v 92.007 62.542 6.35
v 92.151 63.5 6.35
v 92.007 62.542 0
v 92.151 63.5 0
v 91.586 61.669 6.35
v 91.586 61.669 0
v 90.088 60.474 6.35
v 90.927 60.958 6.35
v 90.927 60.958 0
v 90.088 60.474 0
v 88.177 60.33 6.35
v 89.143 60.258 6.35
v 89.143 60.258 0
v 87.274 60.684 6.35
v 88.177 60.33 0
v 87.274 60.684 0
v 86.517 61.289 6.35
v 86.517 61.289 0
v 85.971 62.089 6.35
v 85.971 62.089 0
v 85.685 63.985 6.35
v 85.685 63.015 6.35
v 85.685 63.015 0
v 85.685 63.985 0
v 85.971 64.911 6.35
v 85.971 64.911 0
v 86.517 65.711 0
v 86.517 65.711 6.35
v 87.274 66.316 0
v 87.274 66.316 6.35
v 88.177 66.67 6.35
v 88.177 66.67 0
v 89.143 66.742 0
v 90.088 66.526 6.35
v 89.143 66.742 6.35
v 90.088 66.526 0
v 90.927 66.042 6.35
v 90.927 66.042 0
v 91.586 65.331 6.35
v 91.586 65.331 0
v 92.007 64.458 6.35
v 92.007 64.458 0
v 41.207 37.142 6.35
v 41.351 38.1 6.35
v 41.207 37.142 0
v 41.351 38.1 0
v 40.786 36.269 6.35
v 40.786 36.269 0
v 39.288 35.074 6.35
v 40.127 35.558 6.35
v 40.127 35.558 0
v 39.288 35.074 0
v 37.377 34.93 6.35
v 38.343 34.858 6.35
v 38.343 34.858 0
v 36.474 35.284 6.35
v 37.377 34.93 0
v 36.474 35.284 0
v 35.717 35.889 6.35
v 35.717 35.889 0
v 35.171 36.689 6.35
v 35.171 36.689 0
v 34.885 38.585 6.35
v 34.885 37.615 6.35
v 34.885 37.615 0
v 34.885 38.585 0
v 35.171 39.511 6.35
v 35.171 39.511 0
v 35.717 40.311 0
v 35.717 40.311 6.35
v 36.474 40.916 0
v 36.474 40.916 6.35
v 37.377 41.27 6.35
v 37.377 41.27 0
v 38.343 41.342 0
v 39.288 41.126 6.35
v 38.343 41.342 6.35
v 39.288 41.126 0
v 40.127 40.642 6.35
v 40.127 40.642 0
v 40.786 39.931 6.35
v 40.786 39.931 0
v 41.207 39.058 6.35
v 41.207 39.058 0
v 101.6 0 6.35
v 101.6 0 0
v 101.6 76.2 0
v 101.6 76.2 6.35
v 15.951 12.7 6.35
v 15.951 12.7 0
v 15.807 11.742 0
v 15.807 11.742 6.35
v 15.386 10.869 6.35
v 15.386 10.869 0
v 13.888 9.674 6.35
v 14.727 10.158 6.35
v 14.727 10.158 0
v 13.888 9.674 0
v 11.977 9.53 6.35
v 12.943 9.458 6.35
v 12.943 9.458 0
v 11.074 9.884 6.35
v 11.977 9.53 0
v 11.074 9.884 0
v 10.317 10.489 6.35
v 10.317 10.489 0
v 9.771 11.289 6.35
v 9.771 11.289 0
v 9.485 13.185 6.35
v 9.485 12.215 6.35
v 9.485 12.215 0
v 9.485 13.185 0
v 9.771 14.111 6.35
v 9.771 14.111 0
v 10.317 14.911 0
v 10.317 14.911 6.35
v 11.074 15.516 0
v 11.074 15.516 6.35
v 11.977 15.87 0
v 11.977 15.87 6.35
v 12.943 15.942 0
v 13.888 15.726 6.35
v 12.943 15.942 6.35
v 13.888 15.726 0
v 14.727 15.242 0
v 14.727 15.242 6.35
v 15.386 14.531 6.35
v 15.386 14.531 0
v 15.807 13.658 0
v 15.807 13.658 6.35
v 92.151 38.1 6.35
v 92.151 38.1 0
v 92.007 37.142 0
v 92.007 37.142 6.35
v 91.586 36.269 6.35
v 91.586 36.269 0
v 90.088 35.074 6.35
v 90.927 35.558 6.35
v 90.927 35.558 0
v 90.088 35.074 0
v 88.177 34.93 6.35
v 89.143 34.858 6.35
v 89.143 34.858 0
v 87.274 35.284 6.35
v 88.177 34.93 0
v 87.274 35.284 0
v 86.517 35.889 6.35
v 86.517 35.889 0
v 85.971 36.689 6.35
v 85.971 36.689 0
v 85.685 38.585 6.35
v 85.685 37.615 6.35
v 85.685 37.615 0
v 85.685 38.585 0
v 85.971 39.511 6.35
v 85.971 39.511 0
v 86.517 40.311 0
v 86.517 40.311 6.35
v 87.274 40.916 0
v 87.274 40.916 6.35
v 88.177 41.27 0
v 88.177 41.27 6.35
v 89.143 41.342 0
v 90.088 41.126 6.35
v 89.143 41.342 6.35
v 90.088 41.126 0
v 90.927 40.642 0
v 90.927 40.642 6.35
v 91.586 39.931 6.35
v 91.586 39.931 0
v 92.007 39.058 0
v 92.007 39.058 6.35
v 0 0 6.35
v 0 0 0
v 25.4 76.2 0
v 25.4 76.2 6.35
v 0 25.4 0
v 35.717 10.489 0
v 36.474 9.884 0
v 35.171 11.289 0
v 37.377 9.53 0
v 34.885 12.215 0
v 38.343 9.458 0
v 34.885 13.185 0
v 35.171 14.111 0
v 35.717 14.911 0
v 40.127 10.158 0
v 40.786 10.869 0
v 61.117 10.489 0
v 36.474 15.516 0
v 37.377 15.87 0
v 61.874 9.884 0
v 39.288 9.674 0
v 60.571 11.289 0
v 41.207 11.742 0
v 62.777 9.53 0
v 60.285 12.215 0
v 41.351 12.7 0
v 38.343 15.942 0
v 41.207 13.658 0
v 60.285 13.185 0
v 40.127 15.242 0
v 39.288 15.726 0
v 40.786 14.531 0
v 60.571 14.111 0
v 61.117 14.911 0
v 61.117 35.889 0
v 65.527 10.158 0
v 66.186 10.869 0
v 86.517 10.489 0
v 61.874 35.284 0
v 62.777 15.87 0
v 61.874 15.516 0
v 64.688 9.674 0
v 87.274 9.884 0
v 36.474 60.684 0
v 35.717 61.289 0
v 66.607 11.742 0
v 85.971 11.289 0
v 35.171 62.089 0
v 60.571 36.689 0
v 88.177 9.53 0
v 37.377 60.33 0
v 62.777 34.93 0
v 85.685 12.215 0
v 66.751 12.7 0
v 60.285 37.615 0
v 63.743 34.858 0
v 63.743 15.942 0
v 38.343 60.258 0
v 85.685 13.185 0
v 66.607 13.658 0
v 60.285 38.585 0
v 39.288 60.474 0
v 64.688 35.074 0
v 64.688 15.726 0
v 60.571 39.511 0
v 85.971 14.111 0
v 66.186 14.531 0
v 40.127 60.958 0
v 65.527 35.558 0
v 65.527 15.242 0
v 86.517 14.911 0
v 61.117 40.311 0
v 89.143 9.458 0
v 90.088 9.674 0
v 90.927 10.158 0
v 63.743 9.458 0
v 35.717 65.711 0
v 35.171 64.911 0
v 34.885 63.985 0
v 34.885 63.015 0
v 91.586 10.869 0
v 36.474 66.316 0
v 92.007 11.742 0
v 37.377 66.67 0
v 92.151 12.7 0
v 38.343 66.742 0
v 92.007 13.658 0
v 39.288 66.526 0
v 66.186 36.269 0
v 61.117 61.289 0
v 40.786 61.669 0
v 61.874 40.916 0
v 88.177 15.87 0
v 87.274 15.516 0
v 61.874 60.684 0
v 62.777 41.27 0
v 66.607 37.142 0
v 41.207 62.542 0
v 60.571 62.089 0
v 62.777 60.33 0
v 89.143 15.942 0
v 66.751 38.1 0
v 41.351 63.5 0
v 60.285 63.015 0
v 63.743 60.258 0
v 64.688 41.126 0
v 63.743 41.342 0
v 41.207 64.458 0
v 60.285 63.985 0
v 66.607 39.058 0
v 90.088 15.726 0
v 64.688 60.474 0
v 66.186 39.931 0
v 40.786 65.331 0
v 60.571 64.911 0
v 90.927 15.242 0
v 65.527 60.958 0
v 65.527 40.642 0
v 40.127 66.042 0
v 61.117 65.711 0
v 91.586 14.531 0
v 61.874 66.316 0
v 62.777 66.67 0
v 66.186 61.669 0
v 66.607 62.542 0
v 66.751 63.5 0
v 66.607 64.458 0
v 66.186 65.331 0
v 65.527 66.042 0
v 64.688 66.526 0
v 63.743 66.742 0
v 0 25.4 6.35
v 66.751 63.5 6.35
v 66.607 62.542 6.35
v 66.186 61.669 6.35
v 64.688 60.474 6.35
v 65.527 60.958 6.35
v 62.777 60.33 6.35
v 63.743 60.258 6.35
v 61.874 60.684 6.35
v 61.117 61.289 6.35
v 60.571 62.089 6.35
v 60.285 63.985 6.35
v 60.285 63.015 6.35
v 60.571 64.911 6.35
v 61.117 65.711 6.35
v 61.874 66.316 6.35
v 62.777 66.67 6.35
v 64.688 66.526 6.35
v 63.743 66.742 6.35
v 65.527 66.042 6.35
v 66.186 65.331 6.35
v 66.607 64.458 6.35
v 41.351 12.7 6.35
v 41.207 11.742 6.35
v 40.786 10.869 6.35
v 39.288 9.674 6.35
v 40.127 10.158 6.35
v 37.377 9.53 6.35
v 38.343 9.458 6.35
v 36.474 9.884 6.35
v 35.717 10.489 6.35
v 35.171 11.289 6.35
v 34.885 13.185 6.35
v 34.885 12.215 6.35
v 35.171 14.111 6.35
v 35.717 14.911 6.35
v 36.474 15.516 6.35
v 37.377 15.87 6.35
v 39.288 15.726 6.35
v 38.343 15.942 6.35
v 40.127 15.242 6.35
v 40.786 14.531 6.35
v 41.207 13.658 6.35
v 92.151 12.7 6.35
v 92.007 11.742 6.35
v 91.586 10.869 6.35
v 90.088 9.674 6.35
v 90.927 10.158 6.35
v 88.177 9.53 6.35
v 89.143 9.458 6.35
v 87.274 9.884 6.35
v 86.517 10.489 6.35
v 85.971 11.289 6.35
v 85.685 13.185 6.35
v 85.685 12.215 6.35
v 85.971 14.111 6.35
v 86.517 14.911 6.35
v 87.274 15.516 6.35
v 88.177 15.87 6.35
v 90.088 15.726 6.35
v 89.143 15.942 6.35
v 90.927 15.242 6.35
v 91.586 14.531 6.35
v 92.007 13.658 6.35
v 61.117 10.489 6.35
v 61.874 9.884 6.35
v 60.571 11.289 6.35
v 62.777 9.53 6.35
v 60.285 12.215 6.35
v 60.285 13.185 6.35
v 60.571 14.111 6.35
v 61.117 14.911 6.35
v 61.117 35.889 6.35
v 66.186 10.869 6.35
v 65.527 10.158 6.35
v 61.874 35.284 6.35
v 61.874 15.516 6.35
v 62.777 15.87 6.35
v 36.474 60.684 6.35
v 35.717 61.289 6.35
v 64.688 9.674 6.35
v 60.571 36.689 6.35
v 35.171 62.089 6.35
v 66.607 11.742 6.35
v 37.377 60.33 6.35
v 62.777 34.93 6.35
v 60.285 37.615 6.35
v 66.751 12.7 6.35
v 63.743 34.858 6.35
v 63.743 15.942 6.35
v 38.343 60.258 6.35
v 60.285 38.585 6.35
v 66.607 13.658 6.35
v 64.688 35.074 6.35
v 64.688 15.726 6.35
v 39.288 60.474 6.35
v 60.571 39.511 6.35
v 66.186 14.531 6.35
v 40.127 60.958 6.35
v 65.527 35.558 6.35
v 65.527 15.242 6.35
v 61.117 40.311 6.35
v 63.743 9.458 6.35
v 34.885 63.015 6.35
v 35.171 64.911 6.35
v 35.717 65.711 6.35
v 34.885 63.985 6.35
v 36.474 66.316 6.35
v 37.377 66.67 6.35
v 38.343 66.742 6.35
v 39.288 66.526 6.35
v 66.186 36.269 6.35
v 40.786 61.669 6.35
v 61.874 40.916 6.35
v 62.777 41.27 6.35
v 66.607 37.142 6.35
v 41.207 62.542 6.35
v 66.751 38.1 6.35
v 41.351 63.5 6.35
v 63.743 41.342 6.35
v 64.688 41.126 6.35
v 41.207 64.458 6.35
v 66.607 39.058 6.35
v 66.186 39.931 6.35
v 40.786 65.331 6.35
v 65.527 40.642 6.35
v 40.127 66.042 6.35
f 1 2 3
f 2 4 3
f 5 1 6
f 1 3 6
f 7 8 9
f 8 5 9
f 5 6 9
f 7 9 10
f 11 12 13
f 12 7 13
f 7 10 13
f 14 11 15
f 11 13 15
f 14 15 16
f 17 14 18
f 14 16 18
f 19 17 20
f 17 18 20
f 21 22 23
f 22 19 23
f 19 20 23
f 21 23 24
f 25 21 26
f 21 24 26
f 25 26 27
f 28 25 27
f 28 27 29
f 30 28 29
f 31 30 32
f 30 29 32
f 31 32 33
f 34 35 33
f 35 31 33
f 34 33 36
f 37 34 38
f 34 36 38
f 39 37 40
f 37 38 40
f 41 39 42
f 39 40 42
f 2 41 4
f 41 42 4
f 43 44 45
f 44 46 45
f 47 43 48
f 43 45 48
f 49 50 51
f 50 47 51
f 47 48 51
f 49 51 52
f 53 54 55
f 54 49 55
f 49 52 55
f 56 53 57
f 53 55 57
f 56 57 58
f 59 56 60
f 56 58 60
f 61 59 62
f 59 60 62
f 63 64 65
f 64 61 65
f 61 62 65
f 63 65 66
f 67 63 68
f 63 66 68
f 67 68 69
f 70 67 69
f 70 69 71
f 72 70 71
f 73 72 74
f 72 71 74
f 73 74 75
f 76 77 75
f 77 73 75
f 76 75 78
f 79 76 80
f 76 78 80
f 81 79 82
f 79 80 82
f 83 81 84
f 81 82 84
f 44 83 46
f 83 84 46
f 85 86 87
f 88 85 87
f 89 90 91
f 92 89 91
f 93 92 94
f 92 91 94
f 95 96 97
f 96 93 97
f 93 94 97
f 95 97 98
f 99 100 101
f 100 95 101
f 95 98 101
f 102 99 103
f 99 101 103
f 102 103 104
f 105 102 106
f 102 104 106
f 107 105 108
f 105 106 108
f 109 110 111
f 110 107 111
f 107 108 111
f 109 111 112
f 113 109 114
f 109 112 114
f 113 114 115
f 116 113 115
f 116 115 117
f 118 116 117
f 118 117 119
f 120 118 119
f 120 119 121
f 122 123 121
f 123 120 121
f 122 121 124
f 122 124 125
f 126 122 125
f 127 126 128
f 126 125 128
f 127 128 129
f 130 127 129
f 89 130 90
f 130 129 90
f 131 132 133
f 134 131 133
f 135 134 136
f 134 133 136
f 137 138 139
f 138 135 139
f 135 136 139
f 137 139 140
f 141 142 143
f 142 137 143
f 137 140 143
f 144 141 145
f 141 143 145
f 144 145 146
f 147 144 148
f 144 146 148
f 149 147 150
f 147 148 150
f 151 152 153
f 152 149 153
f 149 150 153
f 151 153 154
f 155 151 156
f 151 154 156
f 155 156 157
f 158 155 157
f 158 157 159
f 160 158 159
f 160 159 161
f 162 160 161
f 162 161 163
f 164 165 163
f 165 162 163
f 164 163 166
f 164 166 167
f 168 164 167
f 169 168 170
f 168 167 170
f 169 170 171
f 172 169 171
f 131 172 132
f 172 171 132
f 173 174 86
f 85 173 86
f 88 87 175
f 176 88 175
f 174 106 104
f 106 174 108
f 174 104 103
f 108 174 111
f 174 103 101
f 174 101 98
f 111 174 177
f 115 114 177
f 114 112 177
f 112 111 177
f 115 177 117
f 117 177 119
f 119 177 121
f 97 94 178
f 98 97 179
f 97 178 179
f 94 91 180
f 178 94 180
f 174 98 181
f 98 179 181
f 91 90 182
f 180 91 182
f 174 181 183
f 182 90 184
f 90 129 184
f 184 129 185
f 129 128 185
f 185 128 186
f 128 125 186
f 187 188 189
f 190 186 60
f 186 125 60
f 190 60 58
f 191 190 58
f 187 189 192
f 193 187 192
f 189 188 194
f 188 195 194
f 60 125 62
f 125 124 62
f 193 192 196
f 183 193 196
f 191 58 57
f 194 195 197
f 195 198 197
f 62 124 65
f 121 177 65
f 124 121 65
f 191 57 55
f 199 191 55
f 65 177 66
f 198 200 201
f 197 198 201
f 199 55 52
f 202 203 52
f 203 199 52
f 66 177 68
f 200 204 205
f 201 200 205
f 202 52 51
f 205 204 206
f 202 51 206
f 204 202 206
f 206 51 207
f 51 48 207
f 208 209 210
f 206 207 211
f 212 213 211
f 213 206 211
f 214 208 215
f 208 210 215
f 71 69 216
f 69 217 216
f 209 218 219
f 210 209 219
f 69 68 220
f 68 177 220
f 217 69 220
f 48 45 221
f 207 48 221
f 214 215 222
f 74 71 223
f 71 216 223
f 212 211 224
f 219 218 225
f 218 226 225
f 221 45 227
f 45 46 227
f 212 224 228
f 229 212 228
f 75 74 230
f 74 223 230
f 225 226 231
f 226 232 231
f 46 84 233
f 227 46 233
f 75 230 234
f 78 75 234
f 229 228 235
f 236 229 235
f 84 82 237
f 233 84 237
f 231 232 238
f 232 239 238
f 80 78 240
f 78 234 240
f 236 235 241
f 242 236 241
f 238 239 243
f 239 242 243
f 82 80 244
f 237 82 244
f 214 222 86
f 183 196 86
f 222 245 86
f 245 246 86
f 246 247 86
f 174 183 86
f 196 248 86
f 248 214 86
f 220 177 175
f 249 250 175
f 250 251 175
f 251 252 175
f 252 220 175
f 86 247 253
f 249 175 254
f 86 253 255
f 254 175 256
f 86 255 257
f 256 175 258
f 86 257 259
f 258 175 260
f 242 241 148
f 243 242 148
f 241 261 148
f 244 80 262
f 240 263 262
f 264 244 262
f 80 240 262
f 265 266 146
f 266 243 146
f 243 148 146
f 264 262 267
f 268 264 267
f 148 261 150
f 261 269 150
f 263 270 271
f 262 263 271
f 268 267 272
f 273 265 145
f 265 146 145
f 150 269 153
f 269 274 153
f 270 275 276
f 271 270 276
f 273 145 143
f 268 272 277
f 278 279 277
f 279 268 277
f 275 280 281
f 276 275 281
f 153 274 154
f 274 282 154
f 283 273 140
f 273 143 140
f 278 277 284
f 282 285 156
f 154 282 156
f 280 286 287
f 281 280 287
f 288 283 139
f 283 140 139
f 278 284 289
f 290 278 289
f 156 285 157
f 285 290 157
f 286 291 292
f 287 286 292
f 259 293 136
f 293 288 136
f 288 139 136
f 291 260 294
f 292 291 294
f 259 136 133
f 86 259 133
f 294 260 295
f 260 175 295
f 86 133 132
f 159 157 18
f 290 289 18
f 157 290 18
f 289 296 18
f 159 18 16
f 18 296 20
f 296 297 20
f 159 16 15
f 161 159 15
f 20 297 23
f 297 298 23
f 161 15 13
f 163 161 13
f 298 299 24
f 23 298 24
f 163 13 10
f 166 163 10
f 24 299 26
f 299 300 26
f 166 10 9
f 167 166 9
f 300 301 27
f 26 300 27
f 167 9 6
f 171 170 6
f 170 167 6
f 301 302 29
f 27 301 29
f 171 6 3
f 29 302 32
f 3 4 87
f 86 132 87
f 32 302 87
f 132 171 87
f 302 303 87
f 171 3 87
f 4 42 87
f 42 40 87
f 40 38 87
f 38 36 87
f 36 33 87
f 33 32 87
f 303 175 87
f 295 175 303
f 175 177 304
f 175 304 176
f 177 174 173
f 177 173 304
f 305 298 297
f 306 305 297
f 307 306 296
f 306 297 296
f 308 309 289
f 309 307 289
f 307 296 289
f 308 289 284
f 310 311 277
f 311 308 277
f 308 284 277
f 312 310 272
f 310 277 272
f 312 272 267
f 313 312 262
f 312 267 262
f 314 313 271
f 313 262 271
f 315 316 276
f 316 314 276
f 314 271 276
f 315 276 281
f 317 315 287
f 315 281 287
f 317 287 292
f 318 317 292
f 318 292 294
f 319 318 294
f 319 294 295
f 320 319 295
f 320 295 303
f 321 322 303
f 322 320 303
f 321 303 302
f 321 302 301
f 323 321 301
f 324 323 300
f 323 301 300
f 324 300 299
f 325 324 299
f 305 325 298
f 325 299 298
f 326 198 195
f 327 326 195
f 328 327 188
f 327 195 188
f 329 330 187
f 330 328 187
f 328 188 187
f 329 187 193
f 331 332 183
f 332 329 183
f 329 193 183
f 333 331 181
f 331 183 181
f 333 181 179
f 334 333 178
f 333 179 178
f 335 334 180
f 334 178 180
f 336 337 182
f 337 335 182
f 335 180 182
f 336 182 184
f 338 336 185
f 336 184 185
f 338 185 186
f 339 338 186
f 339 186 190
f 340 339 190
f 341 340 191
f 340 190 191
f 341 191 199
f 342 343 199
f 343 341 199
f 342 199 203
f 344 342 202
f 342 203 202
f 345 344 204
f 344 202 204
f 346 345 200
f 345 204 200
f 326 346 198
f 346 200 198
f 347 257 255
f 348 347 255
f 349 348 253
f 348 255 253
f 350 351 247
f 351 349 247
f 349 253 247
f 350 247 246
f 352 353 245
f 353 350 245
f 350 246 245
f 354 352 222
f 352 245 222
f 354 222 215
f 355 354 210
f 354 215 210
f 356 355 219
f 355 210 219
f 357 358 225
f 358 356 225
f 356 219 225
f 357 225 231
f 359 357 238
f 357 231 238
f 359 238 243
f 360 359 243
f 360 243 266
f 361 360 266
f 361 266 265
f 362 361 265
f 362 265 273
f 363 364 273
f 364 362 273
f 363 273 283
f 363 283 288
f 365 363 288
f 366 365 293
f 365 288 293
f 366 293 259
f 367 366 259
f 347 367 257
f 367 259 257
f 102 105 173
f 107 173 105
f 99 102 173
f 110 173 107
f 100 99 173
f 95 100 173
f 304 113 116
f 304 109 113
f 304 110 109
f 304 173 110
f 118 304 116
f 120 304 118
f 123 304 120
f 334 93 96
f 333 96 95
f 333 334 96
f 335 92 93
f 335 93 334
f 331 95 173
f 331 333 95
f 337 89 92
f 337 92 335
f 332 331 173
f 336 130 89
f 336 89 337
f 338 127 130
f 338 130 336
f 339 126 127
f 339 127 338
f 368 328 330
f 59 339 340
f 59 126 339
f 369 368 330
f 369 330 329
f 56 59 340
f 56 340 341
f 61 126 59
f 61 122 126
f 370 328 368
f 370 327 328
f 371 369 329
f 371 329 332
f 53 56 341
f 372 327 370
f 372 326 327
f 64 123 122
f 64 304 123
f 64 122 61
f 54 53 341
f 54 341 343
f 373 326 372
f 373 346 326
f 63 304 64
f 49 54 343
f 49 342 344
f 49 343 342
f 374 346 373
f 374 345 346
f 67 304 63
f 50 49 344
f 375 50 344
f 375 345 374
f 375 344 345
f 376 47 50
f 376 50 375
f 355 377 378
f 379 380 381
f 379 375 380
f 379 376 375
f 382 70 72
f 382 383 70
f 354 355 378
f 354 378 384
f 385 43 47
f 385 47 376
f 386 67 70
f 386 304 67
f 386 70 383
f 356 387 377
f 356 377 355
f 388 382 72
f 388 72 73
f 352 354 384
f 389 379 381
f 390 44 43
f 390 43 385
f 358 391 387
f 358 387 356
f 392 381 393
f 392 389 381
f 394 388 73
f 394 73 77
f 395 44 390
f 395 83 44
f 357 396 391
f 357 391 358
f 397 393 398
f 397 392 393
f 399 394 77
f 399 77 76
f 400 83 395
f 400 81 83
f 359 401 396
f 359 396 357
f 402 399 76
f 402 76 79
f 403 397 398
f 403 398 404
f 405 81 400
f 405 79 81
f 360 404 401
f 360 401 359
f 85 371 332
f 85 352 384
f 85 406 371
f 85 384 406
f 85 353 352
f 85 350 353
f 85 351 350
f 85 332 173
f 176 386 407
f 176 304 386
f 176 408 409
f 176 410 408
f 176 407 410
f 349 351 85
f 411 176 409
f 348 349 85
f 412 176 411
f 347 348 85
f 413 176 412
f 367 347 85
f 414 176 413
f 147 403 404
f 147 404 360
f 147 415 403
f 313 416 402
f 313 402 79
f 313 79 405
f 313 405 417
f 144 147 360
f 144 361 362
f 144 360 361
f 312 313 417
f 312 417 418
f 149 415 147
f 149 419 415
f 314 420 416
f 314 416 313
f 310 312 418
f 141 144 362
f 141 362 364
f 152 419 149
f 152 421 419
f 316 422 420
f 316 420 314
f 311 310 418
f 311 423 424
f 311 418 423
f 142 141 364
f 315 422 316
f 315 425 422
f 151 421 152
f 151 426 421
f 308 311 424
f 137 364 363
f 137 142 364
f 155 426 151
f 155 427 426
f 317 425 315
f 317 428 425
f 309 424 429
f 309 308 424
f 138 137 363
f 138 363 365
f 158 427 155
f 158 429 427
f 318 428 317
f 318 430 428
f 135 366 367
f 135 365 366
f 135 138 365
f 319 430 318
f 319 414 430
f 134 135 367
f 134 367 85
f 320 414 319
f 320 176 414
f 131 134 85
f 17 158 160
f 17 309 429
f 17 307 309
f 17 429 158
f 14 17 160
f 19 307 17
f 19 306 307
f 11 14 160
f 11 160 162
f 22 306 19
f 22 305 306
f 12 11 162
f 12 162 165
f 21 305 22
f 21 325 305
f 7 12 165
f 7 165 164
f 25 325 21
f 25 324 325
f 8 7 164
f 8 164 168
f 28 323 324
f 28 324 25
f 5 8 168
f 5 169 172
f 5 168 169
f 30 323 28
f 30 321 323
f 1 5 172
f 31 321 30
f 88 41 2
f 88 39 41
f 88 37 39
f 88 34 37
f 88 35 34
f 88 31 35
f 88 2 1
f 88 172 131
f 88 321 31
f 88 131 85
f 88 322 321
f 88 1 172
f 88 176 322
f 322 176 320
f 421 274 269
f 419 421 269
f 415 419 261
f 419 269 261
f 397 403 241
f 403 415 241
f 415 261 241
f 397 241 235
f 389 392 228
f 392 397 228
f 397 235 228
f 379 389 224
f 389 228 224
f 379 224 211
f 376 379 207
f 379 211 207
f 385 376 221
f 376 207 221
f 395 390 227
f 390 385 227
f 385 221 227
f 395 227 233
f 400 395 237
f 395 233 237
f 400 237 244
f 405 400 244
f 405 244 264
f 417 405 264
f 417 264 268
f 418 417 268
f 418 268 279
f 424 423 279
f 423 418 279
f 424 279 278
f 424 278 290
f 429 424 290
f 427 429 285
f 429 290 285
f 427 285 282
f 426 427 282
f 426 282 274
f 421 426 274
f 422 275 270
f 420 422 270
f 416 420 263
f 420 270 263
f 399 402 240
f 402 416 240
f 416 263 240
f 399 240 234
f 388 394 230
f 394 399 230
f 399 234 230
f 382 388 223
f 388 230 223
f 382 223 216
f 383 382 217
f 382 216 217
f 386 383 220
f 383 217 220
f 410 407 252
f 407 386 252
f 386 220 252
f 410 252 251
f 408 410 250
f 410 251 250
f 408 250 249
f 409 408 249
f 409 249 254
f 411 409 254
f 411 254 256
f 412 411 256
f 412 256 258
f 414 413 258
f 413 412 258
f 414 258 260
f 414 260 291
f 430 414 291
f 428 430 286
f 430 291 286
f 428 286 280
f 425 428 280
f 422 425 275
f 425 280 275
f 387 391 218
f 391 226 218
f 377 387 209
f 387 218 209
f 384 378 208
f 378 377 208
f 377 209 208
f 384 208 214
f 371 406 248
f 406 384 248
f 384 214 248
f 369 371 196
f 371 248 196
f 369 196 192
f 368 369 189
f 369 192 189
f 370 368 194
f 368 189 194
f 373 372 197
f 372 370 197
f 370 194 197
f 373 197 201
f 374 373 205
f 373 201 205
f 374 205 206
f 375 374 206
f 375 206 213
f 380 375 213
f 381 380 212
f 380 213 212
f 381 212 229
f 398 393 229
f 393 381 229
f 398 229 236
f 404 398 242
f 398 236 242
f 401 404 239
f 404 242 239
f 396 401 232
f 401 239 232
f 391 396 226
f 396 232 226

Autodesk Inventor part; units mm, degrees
ref_plane "YZ Plane" through (0, 0, 0) normal (1, 0, 0) x (0, 1, 0)
ref_plane "XZ Plane" through (0, 0, 0) normal (0, 1, 0) x (-1, 0, 0)
ref_plane "XY Plane" through (0, 0, 0) normal (0, 0, 1) x (1, 0, 0)
sketch "Sketch1" plane through (0, 0, 0) normal (0, 0, 1) x (1, 0, 0)
  line L0 (0, 0) -> (101.6, 0)
  line L1 (101.6, 0) -> (101.6, 76.2)
  line L2 (101.6, 76.2) -> (25.4, 76.2)
  line L3 (0, 0) -> (0, 25.4)
  line L4 (0, 25.4) -> (25.4, 76.2)
  circle A0 centre (12.7, 12.7) radius 3.2512
  circle A1 centre (38.1, 12.7) radius 3.2512
  circle A2 centre (63.5, 12.7) radius 3.2512
  circle A3 centre (88.9, 12.7) radius 3.2512
  circle A4 centre (88.9, 38.1) radius 3.2512
  circle A5 centre (63.5, 38.1) radius 3.2512
  circle A6 centre (38.1, 38.1) radius 3.2512
  circle A7 centre (88.9, 63.5) radius 3.2512
  circle A8 centre (63.5, 63.5) radius 3.2512
  circle A9 centre (38.1, 63.5) radius 3.2512
  dimension "d0" = 101.6
  dimension "d1" = 76.2
  dimension "d2" = 76.2
  dimension "d3" = 25.4
  dimension "d4" = 6.5024
  dimension "d5" = 12.7
  dimension "d6" = 12.7
  dimension "d9" = 25.4
  dimension "d16" = 25.4
extrude "Extrusion1" add sketch "Sketch1" along normal blind 6.35
properties part number "3x1 L PLate"
